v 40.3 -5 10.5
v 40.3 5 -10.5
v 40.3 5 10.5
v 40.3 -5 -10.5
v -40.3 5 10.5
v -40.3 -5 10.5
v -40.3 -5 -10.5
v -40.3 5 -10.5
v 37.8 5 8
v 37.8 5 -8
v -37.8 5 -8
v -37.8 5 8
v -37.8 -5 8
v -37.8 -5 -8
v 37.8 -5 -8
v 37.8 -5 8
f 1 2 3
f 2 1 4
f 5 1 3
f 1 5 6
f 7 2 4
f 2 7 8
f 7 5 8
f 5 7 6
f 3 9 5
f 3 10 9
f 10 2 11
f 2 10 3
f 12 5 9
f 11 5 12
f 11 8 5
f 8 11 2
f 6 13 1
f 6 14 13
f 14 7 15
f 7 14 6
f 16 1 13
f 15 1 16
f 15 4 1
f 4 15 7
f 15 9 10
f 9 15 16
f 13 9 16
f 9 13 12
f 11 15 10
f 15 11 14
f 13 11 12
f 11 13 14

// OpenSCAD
PACKSIZE=[75.6,68,16];
  
module A_RechargeBatteryPack() {
  translate(PACKSIZE*-0.5)
    cube(PACKSIZE);
}

module Z_Main() {
  SIZE=(
    PACKSIZE +
    [1,0,1]*2.5*2 - // 2.5mm offset from the XZ plane
    [0,PACKSIZE[1]-10,0] // set Y (thickness)
  );
  
  difference(){ 
    translate(SIZE*-.5)
      cube(SIZE);
    
    A_RechargeBatteryPack();
  }
}

Z_Main();
